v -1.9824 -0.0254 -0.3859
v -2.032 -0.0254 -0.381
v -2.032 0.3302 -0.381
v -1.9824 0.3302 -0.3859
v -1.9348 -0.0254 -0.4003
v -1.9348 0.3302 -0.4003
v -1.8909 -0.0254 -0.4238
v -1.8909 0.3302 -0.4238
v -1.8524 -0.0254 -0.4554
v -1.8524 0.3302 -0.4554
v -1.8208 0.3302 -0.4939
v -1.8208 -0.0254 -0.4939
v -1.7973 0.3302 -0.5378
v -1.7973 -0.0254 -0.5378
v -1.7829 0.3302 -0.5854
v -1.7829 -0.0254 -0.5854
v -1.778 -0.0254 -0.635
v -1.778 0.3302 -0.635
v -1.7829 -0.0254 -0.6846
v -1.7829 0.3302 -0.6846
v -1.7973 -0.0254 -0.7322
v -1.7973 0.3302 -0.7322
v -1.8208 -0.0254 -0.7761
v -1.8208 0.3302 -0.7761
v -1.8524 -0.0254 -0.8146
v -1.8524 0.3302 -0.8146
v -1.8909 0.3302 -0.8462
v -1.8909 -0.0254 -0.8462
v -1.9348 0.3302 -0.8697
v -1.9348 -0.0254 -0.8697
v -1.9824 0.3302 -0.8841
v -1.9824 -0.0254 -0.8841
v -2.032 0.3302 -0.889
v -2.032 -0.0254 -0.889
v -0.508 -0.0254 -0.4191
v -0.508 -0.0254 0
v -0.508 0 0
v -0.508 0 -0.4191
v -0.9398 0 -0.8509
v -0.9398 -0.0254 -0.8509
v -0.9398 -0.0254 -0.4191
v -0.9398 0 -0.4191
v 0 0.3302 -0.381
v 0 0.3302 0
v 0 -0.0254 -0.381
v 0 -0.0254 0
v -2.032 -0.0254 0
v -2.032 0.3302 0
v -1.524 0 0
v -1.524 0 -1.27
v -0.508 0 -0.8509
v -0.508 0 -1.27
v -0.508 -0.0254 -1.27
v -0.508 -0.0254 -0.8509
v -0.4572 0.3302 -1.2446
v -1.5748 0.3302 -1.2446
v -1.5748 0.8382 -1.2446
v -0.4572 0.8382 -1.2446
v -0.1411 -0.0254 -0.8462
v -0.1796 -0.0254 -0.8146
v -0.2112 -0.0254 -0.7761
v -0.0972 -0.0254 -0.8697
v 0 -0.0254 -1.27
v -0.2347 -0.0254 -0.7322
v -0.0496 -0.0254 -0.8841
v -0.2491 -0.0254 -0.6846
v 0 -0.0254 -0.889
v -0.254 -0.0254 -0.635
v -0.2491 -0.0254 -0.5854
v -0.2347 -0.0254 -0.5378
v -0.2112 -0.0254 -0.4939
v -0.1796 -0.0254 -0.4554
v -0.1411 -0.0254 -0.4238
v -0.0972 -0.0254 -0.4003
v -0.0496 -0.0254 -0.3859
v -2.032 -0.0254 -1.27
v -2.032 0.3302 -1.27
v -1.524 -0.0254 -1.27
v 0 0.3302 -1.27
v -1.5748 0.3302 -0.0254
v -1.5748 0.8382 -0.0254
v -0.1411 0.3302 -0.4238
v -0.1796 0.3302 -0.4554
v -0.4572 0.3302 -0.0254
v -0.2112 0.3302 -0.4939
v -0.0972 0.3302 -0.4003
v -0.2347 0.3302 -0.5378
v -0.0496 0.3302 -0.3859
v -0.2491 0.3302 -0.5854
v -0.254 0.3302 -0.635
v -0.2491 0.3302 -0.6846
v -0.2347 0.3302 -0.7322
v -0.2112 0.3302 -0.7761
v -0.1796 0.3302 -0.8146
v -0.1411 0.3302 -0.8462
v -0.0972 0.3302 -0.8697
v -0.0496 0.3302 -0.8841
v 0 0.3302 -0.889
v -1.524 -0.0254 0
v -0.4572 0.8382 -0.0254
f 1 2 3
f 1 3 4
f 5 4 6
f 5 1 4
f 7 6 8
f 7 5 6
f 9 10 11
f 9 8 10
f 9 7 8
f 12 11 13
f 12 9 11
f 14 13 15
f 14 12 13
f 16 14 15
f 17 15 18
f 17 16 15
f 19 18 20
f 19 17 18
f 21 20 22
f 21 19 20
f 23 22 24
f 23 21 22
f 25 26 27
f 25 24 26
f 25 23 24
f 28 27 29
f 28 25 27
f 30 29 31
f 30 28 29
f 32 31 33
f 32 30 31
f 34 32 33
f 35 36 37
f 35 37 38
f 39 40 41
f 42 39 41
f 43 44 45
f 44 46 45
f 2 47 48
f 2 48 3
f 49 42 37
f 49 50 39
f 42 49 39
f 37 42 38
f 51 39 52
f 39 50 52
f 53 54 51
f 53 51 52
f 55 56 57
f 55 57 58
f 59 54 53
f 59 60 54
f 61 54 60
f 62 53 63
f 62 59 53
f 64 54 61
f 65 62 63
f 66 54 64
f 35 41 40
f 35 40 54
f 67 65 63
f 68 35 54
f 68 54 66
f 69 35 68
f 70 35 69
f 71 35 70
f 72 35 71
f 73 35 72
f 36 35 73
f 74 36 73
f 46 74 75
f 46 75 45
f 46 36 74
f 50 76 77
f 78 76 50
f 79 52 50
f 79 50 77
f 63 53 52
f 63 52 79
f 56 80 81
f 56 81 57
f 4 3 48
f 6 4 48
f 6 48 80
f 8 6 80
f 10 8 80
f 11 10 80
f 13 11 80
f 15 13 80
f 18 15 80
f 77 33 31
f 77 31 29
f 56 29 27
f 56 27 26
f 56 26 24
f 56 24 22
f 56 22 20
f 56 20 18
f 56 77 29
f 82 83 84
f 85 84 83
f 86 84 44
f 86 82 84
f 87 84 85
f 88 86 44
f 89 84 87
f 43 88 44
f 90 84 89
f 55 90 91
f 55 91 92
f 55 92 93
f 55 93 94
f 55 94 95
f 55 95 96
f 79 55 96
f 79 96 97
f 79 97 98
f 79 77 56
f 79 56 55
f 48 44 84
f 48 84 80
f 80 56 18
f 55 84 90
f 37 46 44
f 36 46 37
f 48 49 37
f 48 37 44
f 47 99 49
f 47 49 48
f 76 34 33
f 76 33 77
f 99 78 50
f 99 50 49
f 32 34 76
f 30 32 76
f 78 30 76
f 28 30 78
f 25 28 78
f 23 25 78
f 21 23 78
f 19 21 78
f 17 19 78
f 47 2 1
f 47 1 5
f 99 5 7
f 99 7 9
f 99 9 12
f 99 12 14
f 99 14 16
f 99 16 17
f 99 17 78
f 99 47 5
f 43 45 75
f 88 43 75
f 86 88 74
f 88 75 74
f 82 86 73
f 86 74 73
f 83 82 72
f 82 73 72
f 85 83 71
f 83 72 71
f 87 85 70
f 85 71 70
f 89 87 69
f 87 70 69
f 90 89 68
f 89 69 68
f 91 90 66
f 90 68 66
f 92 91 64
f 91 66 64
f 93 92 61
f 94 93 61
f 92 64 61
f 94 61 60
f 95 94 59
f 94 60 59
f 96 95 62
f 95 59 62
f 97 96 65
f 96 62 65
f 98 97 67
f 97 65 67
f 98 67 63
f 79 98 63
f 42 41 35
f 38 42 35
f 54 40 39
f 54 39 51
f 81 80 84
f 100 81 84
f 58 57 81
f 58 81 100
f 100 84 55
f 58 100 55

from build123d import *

# Parameters (mm, degrees)
BOSS_EXTRUDE1_DEPTH = 0.3302
BOSS_EXTRUDE2_START = 0.0254
SKETCH2_W           = 0.4318
SKETCH2_H           = 0.4318
BOSS_EXTRUDE2_DEPTH = 0.0254
SKETCH3_W           = 1.1176
SKETCH3_H           = 1.2192
BOSS_EXTRUDE4_DEPTH = 0.508
SKETCH4_W           = 0.3302
SKETCH4_H           = 0.3302
BOSS_EXTRUDE3_DEPTH = 0.3302


with BuildPart() as part:
    # Sketch1 → Boss-Extrude1 (new body)
    with BuildSketch(Plane(origin=(0, 0, 0), x_dir=(1, 0, 0), z_dir=(0, 1, 0))):
        with BuildLine():
            Line((0, 1.27), (-2.032, 1.27))
            Line((-2.032, 1.27), (-2.032, 0.889))
            ThreePointArc((-2.032, 0.889), (-1.852394878, 0.814605122), (-1.778, 0.635))
            ThreePointArc((-1.778, 0.635), (-1.852394878, 0.455394878), (-2.032, 0.381))
            Line((-2.032, 0.381), (-2.032, 0))
            Line((-2.032, 0), (0, 0))
            Line((0, 0), (0, 0.381))
            ThreePointArc((0, 0.381), (-0.254, 0.635), (0, 0.889))
            Line((0, 0.889), (0, 1.27))
        make_face()
    extrude(amount=BOSS_EXTRUDE1_DEPTH)

    # Sketch2 → Boss-Extrude2 (add)
    with BuildSketch(Plane.XZ.offset(BOSS_EXTRUDE2_START)):
        with BuildLine():
            Line((-2.032, -1.27), (-1.524, -1.27))
            Line((-1.524, -1.27), (-1.524, 0))
            Line((-1.524, 0), (-2.032, 0))
            Line((-2.032, 0), (-2.032, -0.381))
            ThreePointArc((-2.032, -0.381), (-1.778, -0.635), (-2.032, -0.889))
            Line((-2.032, -0.889), (-2.032, -1.27))
        make_face()
        with Locations((-0.7239, -0.635)):
            Rectangle(SKETCH2_W, SKETCH2_H)
        with BuildLine():
            Line((-0.508, -0.8509), (-0.508, -1.27))
            Line((-0.508, -1.27), (0, -1.27))
            Line((0, -1.27), (0, -0.889))
            ThreePointArc((0, -0.889), (-0.254, -0.635), (0, -0.381))
            Line((0, -0.381), (0, 0))
            Line((0, 0), (-0.508, 0))
            Line((-0.508, 0), (-0.508, -0.4191))
            Line((-0.508, -0.4191), (-0.508, -0.8509))
        make_face()
    extrude(amount=-BOSS_EXTRUDE2_DEPTH)

    # Sketch3 → Boss-Extrude4 (add)
    with BuildSketch(Plane(origin=(0, 0.3302, 0), x_dir=(1, 0, 0), z_dir=(0, 1, 0))):
        with Locations((-1.016, 0.635)):
            Rectangle(SKETCH3_W, SKETCH3_H)
    extrude(amount=BOSS_EXTRUDE4_DEPTH)

    # Sketch4 → Boss-Extrude3 (add)
    with BuildSketch(Plane(origin=(0, 0.3302, 0), x_dir=(1, 0, 0), z_dir=(0, 1, 0))):
        with Locations((-0.8001, 0.635)):
            Rectangle(SKETCH4_W, SKETCH4_H)
    extrude(amount=BOSS_EXTRUDE3_DEPTH)


solid = part.part
